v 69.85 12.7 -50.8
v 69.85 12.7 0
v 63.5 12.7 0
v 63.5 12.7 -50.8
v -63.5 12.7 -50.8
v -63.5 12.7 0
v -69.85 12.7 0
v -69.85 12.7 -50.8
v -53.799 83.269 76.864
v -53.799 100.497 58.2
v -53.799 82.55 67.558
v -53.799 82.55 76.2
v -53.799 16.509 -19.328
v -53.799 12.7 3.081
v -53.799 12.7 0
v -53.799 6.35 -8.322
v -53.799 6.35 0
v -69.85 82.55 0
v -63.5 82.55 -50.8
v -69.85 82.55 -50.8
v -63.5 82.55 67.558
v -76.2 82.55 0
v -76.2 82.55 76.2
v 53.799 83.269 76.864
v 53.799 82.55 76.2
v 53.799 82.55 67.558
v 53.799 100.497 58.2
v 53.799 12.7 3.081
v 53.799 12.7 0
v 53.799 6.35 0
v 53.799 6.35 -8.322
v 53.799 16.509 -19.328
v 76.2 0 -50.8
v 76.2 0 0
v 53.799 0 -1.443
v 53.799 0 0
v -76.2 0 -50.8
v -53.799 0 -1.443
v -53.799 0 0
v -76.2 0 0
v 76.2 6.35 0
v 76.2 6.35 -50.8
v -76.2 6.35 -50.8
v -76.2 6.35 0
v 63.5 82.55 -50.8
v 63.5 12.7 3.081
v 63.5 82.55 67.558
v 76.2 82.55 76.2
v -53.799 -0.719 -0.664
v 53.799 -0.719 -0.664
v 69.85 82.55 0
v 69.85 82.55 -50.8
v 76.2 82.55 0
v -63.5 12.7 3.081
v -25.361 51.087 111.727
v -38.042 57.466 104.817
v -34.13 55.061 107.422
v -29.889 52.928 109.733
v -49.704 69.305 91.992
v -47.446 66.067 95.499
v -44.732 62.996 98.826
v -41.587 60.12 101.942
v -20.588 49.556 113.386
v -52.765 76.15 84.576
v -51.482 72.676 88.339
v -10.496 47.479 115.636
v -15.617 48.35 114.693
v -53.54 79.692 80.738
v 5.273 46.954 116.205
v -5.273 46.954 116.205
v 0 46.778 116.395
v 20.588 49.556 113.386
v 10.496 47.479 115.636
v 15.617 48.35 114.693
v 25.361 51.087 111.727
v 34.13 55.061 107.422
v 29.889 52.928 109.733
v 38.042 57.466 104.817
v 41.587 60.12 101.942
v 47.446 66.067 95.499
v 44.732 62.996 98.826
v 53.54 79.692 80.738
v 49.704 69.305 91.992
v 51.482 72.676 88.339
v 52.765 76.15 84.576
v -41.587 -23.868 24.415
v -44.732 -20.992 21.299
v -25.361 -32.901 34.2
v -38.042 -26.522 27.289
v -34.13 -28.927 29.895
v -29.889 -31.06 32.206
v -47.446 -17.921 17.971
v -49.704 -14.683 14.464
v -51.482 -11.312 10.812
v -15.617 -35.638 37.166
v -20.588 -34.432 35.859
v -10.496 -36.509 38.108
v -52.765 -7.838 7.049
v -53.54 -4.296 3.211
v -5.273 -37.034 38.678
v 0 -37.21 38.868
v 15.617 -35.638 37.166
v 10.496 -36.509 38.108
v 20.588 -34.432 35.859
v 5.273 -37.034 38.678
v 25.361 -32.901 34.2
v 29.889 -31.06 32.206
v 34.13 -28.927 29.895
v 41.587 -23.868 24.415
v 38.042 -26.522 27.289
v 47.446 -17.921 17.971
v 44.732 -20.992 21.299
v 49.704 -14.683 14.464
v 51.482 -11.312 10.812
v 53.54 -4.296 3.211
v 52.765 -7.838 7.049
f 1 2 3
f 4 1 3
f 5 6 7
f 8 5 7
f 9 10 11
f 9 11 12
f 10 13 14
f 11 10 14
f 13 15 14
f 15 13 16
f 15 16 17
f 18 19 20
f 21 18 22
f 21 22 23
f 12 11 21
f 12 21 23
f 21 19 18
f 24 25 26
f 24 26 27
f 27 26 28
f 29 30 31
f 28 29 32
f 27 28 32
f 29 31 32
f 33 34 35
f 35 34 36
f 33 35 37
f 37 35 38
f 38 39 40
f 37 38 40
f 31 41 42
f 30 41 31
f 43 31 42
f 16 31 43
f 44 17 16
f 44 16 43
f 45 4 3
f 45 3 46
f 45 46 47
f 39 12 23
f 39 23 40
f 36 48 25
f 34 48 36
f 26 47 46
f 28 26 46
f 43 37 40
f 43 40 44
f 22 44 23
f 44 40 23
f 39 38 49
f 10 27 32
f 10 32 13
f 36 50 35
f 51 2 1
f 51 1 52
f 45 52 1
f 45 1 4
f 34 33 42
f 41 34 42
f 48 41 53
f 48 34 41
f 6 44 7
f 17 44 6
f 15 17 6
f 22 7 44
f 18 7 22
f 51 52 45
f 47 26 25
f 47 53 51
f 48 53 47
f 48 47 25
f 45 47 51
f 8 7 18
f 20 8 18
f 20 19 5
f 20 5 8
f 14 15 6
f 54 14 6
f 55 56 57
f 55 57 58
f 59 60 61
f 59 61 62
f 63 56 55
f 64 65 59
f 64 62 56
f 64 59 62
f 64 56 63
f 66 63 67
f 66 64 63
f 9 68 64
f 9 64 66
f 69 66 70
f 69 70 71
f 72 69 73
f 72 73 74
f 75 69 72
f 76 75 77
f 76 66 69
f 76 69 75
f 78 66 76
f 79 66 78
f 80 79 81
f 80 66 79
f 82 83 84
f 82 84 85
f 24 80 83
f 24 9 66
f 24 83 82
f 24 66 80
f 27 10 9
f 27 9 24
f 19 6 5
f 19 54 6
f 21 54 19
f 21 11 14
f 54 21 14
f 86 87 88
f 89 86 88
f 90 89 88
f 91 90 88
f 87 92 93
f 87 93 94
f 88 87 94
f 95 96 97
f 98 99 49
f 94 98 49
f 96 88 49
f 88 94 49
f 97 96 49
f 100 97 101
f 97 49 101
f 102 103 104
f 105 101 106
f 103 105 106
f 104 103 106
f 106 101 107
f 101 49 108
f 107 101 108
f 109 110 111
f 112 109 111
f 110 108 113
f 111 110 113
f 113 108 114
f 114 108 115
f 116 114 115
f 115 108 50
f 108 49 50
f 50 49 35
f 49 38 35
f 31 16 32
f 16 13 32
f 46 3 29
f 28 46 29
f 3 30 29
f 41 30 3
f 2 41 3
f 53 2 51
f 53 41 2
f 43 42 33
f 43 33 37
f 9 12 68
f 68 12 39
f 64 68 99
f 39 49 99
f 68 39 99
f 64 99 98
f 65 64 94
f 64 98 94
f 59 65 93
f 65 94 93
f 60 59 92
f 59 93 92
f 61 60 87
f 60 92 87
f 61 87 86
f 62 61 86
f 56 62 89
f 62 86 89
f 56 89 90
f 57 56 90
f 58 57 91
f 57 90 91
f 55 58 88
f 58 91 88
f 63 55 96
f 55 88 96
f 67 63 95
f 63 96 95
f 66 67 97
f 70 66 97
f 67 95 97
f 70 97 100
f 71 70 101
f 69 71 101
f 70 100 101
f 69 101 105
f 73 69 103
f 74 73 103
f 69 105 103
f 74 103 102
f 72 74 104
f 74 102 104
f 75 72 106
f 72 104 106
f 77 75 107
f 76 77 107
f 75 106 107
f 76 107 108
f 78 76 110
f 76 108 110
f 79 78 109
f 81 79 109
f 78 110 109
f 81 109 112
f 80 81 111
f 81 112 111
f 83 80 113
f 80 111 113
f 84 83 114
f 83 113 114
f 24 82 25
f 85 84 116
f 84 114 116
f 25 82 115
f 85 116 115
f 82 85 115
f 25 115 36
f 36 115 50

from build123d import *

# Parameters (mm, degrees)
BOSS_EXTRUDE2_DEPTH              = 76.2
BOSS_EXTRUDE2_DEPTH_BACK         = 76.2
SKETCH6_W                        = 152.4
SKETCH6_H                        = 6.35
SKETCH6_W_2                      = 6.35
SKETCH6_H_2                      = 69.85
BOSS_EXTRUDE3_DEPTH              = 50.8
CUT_EXTRUDE3_REACH               = 144.097
CUT_EXTRUDE3_OFFSET_FROM_SURFACE = 6.35
SKETCH7_W                        = 127
SKETCH7_H                        = 69.85
BOSS_EXTRUDE5_DEPTH              = 57.15


with BuildPart() as part:
    # Sketch4 → Boss-Extrude2 (new, two sides: drawn at the far end of the back side and taken through both)
    with BuildSketch(Plane(origin=(0, 0, 0), x_dir=(0, 0, -1), z_dir=(1, 0, 0)).offset(-BOSS_EXTRUDE2_DEPTH_BACK)):
        Polygon((0, 0), (0, 82.55), (-76.2, 82.55), align=None)
    extrude(amount=BOSS_EXTRUDE2_DEPTH + BOSS_EXTRUDE2_DEPTH_BACK)

    # Sketch6 → Boss-Extrude3 (add)
    with BuildSketch(Plane(origin=(0, 0, 0), x_dir=(-1, 0, 0), z_dir=(0, 0, -1))):
        with Locations((0, 3.175)):
            Rectangle(SKETCH6_W, SKETCH6_H)
        with Locations((-66.675, 47.625)):
            Rectangle(SKETCH6_W_2, SKETCH6_H_2)
        with Locations((66.675, 47.625)):
            Rectangle(SKETCH6_W_2, SKETCH6_H_2)
    extrude(amount=BOSS_EXTRUDE3_DEPTH)

    # Cut-Extrude3: up to this face of the body (flat: up to its plane, moved by the offset)
    cut_extrude3_end = Plane(part.part.faces().sort_by_distance((0, 41.275, 38.1))[0]).offset(-CUT_EXTRUDE3_OFFSET_FROM_SURFACE)
    # Sketch7 → Cut-Extrude3 (cut, up to the picked face)
    with BuildSketch(Plane(origin=(0, 0, 0), x_dir=(-1, 0, 0), z_dir=(0, 0, -1)), mode=Mode.PRIVATE) as cut_extrude3_sk1:
        with Locations((0, 47.625)):
            Rectangle(SKETCH7_W, SKETCH7_H)
    cut_extrude3_tool1 = split(extrude(cut_extrude3_sk1.sketch, amount=-CUT_EXTRUDE3_REACH, mode=Mode.PRIVATE), bisect_by=cut_extrude3_end, keep=Keep.BOTH, mode=Mode.PRIVATE)
    add(cut_extrude3_tool1.solids().sort_by(Axis((0, 47.625, 0), (0, 0, 1)))[0], mode=Mode.SUBTRACT)

    # Sketch8 → Boss-Extrude5 (add, symmetric)
    with BuildSketch(Plane(origin=(0, 41.275, 38.1), x_dir=(-1, 0, 0), z_dir=(0, -0.7348034446274878, -0.6782801027330659))):
        with BuildLine():
            Line((-53.798871559, 0), (-53.798871559, 25.4))
            Line((-53.798871559, 25.4), (53.798871559, 25.4))
            Line((53.798871559, 25.4), (53.798871559, 0))
            ThreePointArc((53.798871559, 0), (0, -53.798871559), (-53.798871559, 0))
        make_face()
    extrude(amount=BOSS_EXTRUDE5_DEPTH, both=True)


solid = part.part
